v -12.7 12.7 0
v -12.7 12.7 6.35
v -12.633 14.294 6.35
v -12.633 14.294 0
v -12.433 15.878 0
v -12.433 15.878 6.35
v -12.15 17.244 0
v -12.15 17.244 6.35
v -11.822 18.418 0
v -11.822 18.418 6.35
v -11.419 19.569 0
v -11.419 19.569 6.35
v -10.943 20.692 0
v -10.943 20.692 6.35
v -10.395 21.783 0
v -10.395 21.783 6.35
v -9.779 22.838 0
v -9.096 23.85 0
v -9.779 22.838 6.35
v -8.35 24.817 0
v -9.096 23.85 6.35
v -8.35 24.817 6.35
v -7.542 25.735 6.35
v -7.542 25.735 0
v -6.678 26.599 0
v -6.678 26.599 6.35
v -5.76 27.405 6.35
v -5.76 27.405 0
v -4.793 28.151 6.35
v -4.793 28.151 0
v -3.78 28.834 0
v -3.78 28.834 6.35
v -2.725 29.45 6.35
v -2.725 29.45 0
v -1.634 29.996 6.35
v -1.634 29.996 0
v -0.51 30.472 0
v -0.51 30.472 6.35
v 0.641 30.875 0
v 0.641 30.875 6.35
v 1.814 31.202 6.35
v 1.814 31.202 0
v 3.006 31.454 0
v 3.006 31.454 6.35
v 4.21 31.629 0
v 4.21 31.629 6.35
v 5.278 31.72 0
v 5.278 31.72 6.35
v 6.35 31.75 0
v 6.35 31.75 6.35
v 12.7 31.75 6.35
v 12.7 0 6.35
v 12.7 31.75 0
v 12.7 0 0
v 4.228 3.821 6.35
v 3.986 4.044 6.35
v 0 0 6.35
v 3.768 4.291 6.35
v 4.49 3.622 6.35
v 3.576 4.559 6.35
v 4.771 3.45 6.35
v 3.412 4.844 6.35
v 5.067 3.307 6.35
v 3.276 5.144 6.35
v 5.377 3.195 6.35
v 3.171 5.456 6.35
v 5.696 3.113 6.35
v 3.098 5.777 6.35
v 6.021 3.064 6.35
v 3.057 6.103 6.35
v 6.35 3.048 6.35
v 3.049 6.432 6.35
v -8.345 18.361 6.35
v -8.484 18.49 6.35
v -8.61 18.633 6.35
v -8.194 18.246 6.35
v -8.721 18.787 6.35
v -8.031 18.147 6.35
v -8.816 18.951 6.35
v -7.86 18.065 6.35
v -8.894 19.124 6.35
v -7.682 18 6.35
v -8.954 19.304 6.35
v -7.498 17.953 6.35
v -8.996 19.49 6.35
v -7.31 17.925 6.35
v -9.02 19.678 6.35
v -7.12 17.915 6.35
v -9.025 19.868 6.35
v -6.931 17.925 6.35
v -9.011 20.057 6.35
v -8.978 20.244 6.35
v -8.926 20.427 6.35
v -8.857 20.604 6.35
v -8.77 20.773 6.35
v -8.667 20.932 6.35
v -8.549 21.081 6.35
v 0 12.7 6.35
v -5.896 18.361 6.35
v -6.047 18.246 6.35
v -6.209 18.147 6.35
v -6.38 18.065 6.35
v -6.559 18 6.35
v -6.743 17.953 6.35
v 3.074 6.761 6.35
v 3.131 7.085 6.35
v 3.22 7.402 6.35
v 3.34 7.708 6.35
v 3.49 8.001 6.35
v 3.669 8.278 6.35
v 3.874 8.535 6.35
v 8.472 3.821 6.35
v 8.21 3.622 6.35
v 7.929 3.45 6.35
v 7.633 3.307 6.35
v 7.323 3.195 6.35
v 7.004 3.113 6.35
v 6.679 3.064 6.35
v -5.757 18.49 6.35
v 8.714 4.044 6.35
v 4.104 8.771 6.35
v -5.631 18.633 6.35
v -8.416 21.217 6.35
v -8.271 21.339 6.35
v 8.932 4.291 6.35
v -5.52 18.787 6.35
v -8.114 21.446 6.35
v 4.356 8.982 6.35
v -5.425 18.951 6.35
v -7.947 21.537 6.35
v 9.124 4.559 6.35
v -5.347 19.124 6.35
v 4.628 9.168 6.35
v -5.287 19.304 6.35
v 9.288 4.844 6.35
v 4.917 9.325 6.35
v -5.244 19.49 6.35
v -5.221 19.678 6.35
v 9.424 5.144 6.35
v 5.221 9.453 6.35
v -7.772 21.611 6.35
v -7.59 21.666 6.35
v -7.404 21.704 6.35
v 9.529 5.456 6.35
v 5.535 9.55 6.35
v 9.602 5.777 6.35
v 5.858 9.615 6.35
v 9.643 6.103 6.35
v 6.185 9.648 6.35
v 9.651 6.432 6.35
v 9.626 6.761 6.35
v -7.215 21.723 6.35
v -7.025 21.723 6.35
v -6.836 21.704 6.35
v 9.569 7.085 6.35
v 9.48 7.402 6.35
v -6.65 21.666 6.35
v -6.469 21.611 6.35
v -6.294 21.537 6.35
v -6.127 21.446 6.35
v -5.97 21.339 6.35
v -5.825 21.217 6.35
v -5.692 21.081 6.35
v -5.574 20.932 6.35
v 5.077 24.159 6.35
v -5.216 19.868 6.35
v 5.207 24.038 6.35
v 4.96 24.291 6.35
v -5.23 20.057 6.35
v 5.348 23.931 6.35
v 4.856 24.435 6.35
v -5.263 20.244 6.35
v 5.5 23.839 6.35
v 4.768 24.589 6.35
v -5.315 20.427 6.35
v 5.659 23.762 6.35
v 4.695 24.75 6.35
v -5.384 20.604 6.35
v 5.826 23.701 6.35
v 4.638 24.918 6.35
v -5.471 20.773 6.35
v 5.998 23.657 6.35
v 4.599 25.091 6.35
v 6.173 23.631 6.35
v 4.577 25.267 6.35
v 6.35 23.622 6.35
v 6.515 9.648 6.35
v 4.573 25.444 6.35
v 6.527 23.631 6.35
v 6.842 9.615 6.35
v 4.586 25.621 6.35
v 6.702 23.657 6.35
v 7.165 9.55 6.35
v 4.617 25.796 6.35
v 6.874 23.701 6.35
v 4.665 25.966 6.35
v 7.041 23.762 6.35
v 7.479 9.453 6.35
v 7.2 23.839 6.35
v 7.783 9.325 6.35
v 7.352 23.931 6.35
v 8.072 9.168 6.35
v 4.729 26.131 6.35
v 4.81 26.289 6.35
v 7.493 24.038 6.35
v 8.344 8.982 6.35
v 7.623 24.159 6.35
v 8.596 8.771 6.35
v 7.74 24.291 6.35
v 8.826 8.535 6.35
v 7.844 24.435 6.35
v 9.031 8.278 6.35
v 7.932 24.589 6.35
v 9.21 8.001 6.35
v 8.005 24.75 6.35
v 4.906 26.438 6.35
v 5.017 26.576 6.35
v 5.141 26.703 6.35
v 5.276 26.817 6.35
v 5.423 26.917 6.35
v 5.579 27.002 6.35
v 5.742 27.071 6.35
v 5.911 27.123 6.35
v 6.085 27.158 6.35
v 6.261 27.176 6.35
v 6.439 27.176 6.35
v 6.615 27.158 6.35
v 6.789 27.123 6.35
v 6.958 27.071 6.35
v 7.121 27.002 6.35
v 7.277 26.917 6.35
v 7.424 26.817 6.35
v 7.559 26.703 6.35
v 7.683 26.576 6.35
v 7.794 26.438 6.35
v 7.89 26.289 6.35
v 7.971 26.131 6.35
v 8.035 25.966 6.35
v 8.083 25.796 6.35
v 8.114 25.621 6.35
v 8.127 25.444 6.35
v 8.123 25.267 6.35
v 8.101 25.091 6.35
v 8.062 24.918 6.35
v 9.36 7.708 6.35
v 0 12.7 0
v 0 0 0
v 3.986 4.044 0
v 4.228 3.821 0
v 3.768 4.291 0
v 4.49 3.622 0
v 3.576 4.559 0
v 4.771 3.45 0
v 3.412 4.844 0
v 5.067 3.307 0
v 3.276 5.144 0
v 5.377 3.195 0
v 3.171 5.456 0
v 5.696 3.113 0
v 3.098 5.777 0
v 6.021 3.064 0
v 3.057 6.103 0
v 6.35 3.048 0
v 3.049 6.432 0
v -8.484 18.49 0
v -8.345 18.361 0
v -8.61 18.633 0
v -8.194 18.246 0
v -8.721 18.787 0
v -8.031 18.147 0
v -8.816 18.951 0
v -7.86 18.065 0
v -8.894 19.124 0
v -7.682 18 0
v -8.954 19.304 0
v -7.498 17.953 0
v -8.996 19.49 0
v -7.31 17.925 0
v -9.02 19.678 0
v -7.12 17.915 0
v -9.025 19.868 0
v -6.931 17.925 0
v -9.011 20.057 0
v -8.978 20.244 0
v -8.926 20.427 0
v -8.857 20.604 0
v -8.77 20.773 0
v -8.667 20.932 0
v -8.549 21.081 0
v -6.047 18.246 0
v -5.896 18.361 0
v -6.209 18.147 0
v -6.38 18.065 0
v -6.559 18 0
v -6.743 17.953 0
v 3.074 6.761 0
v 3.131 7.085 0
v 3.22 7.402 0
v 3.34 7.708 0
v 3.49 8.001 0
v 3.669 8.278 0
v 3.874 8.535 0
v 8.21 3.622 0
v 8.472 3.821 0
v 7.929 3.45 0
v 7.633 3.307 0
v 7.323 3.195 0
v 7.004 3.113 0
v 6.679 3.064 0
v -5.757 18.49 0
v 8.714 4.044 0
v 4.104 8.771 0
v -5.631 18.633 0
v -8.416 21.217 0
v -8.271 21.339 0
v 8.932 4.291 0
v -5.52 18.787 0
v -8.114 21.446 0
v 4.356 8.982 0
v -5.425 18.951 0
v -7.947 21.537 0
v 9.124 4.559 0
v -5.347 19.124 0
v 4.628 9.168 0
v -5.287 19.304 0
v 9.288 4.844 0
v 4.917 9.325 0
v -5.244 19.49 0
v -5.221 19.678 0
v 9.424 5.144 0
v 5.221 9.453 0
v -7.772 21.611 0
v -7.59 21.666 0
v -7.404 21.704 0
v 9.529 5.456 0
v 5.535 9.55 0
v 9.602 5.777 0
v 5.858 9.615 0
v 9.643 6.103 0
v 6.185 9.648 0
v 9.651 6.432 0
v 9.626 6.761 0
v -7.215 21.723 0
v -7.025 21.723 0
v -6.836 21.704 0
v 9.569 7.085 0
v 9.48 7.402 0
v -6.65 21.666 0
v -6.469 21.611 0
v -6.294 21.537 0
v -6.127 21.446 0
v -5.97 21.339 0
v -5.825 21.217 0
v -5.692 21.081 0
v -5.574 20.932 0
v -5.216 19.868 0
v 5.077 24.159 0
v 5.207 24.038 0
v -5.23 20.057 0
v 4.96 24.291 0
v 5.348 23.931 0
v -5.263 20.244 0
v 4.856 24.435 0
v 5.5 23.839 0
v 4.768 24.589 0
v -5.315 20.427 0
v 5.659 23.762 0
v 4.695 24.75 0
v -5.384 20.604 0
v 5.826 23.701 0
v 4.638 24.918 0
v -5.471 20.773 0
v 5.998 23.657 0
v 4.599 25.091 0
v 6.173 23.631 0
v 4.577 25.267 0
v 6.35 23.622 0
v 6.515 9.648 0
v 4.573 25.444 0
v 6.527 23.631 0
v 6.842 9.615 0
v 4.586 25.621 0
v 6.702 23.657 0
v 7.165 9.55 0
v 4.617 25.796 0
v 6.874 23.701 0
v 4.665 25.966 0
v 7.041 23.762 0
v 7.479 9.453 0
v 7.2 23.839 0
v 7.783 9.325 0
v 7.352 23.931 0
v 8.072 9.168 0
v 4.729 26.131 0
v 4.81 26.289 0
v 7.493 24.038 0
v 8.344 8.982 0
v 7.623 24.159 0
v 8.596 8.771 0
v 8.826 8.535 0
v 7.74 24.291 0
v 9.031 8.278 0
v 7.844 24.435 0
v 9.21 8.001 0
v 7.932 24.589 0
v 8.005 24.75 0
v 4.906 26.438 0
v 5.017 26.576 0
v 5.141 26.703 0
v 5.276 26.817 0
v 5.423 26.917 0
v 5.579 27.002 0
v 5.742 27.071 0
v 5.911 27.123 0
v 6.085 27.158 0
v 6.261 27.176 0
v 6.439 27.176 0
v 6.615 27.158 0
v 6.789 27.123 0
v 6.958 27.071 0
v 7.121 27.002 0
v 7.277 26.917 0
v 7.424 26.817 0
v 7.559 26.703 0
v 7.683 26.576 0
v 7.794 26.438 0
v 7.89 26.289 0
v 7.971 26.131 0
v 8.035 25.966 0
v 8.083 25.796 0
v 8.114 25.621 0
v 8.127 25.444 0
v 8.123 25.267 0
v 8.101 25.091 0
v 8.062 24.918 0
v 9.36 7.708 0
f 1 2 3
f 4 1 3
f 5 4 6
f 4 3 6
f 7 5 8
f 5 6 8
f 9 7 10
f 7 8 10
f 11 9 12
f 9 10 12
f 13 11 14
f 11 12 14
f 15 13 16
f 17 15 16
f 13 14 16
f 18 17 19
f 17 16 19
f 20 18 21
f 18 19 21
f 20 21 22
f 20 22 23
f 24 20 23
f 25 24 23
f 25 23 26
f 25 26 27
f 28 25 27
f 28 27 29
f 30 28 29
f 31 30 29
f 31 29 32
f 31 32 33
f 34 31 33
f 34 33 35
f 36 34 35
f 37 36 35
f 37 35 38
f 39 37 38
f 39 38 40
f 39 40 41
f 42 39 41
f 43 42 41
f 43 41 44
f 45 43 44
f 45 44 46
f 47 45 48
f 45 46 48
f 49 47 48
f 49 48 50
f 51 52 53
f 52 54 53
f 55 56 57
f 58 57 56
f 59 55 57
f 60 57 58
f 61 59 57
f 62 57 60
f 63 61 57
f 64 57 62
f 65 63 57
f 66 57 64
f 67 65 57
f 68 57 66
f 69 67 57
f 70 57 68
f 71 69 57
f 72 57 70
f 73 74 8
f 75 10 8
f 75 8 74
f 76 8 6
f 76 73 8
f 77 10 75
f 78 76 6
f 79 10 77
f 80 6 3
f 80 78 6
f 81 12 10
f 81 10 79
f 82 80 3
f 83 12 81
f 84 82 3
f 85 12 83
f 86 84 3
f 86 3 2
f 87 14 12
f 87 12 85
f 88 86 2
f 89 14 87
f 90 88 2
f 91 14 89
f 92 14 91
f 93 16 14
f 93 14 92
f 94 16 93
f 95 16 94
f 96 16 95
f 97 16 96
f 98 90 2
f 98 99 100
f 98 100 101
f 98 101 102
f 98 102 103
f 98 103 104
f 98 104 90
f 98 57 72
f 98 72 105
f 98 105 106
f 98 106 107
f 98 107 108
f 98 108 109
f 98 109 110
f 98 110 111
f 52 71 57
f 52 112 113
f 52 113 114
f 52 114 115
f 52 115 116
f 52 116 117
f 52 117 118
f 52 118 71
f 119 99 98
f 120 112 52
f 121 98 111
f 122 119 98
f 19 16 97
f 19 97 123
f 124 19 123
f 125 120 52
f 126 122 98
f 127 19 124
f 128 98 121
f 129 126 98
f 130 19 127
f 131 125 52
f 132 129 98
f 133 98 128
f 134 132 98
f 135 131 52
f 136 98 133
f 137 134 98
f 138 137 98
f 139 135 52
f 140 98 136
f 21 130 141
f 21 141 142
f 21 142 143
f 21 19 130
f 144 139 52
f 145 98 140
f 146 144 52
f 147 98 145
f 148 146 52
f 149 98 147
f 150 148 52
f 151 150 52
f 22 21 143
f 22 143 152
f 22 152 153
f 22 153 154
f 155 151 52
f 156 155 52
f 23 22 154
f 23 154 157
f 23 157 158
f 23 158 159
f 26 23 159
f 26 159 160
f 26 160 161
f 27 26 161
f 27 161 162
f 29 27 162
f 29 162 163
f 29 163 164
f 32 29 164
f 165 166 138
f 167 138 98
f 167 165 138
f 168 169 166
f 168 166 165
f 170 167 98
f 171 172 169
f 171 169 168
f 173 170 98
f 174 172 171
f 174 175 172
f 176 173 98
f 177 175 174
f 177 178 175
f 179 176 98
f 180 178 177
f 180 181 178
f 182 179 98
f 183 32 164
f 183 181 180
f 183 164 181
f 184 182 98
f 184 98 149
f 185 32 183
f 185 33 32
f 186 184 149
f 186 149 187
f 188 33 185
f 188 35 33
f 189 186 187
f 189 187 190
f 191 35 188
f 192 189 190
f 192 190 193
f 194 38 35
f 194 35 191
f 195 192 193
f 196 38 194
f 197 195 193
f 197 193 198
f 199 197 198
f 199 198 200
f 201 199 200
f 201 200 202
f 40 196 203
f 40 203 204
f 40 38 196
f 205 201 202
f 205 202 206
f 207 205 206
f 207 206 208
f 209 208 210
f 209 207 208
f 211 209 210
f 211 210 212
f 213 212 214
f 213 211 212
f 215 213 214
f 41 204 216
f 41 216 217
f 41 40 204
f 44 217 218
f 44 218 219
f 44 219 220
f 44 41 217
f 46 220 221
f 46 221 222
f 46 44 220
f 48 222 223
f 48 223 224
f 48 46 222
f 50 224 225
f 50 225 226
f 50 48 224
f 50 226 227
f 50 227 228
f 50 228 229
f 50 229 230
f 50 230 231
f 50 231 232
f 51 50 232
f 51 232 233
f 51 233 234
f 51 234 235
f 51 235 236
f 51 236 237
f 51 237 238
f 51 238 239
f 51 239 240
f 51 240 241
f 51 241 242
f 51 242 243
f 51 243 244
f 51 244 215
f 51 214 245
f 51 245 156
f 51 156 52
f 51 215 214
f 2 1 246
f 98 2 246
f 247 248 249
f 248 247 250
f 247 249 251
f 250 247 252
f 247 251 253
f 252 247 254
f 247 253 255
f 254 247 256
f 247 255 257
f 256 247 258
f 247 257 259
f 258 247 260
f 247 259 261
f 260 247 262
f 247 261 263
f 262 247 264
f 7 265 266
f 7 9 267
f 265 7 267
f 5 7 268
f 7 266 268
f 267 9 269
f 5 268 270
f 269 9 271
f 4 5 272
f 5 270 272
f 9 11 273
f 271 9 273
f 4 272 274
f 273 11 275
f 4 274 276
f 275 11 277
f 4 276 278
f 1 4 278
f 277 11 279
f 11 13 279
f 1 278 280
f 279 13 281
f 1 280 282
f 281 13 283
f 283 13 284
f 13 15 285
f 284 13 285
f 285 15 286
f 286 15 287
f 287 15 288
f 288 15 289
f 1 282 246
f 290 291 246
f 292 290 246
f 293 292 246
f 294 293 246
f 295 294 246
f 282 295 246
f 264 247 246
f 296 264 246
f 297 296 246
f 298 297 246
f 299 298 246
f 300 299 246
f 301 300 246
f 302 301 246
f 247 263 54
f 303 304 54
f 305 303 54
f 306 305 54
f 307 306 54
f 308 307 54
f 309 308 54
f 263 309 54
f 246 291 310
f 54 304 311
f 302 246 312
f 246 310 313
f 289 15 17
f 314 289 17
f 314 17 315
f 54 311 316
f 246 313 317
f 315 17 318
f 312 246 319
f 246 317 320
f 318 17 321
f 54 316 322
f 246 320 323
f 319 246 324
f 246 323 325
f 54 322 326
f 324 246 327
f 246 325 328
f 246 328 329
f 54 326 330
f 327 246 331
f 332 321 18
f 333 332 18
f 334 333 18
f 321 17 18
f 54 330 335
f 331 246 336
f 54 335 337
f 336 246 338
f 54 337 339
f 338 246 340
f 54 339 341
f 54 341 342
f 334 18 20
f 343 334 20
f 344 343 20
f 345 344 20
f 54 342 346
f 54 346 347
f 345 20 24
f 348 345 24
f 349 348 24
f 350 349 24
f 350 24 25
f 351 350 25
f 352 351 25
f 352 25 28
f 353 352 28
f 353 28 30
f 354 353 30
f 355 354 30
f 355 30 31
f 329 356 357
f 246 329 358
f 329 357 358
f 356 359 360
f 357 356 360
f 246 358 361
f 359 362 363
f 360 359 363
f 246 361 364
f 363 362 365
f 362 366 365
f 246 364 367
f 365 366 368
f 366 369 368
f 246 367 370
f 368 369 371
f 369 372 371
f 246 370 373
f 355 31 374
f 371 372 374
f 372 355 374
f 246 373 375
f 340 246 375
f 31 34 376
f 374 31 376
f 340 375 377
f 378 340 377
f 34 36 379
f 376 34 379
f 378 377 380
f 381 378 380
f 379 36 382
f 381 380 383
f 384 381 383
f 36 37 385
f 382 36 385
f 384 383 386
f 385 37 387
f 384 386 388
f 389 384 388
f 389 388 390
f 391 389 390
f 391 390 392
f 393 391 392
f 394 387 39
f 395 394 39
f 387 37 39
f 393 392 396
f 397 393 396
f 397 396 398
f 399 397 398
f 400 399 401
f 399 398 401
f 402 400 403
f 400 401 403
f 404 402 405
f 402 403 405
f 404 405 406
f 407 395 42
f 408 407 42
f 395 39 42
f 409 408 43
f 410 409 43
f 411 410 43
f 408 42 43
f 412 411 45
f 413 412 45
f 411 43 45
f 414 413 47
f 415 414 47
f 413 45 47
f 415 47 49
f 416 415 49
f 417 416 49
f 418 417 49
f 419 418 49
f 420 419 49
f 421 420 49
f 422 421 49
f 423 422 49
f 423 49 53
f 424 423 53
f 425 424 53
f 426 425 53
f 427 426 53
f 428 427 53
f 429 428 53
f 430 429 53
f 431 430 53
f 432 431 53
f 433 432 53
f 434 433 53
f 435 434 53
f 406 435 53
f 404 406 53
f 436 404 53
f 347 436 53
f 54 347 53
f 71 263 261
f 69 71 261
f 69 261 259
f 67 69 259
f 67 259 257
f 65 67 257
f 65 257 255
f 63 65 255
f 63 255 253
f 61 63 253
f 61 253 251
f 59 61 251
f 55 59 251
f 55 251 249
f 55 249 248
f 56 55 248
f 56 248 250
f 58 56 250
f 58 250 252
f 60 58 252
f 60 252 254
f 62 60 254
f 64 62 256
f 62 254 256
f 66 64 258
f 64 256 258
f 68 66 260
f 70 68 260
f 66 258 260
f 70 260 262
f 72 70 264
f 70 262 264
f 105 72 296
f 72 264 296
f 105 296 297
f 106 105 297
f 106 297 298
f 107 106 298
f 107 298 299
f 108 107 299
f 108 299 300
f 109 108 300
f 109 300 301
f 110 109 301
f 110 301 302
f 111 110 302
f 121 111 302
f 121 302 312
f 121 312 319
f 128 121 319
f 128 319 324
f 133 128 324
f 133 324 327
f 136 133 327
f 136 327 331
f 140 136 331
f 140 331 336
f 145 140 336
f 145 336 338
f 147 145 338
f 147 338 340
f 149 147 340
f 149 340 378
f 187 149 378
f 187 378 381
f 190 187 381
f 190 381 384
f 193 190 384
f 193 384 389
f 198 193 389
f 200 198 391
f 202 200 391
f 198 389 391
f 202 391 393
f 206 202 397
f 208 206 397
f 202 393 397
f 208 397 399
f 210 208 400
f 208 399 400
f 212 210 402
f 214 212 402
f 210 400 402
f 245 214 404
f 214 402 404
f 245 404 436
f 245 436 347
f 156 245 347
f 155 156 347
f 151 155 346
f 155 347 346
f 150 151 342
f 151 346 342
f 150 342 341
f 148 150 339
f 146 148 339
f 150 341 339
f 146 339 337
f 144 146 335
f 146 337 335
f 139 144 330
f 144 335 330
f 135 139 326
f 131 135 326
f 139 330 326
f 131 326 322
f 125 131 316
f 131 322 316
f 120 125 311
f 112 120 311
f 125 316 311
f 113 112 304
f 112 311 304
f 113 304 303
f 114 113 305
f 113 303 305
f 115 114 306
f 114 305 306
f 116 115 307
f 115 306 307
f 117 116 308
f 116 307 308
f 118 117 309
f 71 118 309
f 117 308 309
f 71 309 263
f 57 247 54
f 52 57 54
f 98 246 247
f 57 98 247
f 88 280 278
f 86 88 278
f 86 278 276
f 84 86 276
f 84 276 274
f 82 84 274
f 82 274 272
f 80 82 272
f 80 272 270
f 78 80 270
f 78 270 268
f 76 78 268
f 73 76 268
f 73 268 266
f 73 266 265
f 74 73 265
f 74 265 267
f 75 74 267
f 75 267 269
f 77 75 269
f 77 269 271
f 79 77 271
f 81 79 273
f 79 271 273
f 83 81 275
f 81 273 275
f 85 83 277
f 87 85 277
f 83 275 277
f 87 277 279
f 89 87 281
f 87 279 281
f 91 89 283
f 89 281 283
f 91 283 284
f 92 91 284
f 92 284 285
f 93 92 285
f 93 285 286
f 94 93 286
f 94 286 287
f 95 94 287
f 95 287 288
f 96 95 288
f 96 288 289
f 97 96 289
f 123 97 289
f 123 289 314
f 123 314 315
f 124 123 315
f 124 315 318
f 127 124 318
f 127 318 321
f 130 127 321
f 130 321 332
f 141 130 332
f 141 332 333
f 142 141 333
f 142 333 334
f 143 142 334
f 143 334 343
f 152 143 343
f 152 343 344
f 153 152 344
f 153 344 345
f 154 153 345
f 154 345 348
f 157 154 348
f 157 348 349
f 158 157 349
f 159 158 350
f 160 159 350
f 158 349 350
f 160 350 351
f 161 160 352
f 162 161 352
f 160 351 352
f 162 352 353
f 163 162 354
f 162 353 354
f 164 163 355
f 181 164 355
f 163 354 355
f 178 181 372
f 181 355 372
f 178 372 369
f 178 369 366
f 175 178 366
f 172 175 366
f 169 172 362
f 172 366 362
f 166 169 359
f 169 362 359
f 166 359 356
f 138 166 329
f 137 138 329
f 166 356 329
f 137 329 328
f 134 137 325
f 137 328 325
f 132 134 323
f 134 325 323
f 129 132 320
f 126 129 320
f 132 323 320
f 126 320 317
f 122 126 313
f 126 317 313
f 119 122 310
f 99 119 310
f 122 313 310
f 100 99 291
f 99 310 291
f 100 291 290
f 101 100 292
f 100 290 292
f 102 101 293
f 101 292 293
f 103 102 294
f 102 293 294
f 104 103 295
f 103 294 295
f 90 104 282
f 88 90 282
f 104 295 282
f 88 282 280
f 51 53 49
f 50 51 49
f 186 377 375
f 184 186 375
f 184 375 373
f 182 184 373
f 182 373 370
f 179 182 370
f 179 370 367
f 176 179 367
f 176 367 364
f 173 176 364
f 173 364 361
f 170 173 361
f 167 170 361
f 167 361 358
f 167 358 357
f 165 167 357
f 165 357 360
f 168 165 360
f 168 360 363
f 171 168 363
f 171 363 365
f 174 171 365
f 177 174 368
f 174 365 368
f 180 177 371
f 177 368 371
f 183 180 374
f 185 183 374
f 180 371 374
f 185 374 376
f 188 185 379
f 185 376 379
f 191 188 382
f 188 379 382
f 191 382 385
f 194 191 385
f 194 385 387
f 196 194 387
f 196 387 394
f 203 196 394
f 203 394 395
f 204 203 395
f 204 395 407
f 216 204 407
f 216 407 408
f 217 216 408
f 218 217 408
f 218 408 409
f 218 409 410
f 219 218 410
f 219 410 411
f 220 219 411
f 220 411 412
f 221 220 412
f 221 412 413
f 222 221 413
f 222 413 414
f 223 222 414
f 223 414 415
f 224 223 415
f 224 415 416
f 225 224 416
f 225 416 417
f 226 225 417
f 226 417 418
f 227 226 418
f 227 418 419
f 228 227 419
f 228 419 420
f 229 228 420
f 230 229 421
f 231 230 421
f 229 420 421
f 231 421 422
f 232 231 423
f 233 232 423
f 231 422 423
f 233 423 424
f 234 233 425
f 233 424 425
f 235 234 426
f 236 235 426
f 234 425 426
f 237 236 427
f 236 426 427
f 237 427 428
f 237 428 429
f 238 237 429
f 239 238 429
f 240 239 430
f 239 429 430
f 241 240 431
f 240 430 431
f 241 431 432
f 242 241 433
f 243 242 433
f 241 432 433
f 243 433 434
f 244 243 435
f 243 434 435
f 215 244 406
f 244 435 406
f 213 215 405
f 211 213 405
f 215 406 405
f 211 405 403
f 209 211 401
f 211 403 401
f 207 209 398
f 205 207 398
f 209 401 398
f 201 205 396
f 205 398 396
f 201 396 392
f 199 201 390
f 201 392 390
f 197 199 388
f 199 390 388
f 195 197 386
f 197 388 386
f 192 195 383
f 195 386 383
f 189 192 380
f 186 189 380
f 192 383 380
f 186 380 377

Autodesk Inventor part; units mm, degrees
ref_plane "YZ Plane" through (0, 0, 0) normal (1, 0, 0) x (0, 1, 0)
ref_plane "XZ Plane" through (0, 0, 0) normal (0, 1, 0) x (-1, 0, 0)
ref_plane "XY Plane" through (0, 0, 0) normal (0, 0, 1) x (1, 0, 0)
sketch "Sketch1" plane through (0, 0, 0) normal (0, 0, 1) x (1, 0, 0)
  line L0 (0, 0) -> (12.7, 0)
  line L1 (12.7, 0) -> (12.7, 31.75)
  line L2 (12.7, 31.75) -> (0, 31.75)
  line L3 (0, 12.7) -> (0, 0)
  line L4 (12.7, 31.75) -> (-12.7, 31.75)
  line L5 (-12.7, 31.75) -> (-12.7, 12.7)
  line L6 (-12.7, 12.7) -> (0, 12.7)
  line L7 (12.7, 12.7) -> (12.7, 31.75)
  dimension "d1" = 31.75
  dimension "d2" = 25.4
  dimension "d3" = 19.05
  dimension "d4" = 12.7
  dimension "d5" = 12.7
extrude "Extrusion1" add sketch "Sketch1" along normal blind 6.35
fillet "Fillet1" radius 19.05 1 edges at (-12.7, 31.75, 3.175)
sketch "Sketch2" plane through (0, 0, 6.35) normal (0, 0, 1) x (1, 0, 0)
  line L0 (12.7, 0) -> (12.7, 31.75) projected
  line L1 (0, 0) -> (12.7, 0) projected
  point P0 (6.35, 6.35)
  dimension "d11" = 6.35
  dimension "d12" = 6.35
hole "Hole1" at (6.35, 6.35, 6.35) direction (0, 0, -1) diameter 6.604 end through all
sketch "Sketch3" plane through (0, 0, 6.35) normal (0, 0, 1) x (1, 0, 0)
  line L0 (12.7, 0) -> (12.7, 31.75) projected
  line L1 (12.7, 31.75) -> (6.35, 31.75) projected
  point P0 (0, 0)
  point P1 (6.35, 25.4)
  dimension "d20" = 6.35
  dimension "d21" = 6.35
hole "Hole2" at (6.35, 25.4, 6.35) direction (0, 0, -1) diameter 3.556 end through all
sketch "Sketch4" plane through (0, 0, 6.35) normal (0, 0, 1) x (1, 0, 0)
  circle A0 centre (6.35, 6.35) radius 3.302 projected
  circle A1 centre (6.35, 6.35) radius 19.05
  line L0 (-7.1204, 19.8204) -> (6.35, 6.35)
  line L1 (12.7, 0) -> (12.7, 31.75) projected
  point P0 (0, 0)
  dimension "d29" = 38.1
  dimension "d30" = 45
hole "Hole3" at (-7.1204, 19.8204, 6.35) direction (0, 0, -1) diameter 3.81 end through all
equation "\"d12\" = d11"
equation "\"d21\" = d20"
properties part number "Shooter_Stop"
